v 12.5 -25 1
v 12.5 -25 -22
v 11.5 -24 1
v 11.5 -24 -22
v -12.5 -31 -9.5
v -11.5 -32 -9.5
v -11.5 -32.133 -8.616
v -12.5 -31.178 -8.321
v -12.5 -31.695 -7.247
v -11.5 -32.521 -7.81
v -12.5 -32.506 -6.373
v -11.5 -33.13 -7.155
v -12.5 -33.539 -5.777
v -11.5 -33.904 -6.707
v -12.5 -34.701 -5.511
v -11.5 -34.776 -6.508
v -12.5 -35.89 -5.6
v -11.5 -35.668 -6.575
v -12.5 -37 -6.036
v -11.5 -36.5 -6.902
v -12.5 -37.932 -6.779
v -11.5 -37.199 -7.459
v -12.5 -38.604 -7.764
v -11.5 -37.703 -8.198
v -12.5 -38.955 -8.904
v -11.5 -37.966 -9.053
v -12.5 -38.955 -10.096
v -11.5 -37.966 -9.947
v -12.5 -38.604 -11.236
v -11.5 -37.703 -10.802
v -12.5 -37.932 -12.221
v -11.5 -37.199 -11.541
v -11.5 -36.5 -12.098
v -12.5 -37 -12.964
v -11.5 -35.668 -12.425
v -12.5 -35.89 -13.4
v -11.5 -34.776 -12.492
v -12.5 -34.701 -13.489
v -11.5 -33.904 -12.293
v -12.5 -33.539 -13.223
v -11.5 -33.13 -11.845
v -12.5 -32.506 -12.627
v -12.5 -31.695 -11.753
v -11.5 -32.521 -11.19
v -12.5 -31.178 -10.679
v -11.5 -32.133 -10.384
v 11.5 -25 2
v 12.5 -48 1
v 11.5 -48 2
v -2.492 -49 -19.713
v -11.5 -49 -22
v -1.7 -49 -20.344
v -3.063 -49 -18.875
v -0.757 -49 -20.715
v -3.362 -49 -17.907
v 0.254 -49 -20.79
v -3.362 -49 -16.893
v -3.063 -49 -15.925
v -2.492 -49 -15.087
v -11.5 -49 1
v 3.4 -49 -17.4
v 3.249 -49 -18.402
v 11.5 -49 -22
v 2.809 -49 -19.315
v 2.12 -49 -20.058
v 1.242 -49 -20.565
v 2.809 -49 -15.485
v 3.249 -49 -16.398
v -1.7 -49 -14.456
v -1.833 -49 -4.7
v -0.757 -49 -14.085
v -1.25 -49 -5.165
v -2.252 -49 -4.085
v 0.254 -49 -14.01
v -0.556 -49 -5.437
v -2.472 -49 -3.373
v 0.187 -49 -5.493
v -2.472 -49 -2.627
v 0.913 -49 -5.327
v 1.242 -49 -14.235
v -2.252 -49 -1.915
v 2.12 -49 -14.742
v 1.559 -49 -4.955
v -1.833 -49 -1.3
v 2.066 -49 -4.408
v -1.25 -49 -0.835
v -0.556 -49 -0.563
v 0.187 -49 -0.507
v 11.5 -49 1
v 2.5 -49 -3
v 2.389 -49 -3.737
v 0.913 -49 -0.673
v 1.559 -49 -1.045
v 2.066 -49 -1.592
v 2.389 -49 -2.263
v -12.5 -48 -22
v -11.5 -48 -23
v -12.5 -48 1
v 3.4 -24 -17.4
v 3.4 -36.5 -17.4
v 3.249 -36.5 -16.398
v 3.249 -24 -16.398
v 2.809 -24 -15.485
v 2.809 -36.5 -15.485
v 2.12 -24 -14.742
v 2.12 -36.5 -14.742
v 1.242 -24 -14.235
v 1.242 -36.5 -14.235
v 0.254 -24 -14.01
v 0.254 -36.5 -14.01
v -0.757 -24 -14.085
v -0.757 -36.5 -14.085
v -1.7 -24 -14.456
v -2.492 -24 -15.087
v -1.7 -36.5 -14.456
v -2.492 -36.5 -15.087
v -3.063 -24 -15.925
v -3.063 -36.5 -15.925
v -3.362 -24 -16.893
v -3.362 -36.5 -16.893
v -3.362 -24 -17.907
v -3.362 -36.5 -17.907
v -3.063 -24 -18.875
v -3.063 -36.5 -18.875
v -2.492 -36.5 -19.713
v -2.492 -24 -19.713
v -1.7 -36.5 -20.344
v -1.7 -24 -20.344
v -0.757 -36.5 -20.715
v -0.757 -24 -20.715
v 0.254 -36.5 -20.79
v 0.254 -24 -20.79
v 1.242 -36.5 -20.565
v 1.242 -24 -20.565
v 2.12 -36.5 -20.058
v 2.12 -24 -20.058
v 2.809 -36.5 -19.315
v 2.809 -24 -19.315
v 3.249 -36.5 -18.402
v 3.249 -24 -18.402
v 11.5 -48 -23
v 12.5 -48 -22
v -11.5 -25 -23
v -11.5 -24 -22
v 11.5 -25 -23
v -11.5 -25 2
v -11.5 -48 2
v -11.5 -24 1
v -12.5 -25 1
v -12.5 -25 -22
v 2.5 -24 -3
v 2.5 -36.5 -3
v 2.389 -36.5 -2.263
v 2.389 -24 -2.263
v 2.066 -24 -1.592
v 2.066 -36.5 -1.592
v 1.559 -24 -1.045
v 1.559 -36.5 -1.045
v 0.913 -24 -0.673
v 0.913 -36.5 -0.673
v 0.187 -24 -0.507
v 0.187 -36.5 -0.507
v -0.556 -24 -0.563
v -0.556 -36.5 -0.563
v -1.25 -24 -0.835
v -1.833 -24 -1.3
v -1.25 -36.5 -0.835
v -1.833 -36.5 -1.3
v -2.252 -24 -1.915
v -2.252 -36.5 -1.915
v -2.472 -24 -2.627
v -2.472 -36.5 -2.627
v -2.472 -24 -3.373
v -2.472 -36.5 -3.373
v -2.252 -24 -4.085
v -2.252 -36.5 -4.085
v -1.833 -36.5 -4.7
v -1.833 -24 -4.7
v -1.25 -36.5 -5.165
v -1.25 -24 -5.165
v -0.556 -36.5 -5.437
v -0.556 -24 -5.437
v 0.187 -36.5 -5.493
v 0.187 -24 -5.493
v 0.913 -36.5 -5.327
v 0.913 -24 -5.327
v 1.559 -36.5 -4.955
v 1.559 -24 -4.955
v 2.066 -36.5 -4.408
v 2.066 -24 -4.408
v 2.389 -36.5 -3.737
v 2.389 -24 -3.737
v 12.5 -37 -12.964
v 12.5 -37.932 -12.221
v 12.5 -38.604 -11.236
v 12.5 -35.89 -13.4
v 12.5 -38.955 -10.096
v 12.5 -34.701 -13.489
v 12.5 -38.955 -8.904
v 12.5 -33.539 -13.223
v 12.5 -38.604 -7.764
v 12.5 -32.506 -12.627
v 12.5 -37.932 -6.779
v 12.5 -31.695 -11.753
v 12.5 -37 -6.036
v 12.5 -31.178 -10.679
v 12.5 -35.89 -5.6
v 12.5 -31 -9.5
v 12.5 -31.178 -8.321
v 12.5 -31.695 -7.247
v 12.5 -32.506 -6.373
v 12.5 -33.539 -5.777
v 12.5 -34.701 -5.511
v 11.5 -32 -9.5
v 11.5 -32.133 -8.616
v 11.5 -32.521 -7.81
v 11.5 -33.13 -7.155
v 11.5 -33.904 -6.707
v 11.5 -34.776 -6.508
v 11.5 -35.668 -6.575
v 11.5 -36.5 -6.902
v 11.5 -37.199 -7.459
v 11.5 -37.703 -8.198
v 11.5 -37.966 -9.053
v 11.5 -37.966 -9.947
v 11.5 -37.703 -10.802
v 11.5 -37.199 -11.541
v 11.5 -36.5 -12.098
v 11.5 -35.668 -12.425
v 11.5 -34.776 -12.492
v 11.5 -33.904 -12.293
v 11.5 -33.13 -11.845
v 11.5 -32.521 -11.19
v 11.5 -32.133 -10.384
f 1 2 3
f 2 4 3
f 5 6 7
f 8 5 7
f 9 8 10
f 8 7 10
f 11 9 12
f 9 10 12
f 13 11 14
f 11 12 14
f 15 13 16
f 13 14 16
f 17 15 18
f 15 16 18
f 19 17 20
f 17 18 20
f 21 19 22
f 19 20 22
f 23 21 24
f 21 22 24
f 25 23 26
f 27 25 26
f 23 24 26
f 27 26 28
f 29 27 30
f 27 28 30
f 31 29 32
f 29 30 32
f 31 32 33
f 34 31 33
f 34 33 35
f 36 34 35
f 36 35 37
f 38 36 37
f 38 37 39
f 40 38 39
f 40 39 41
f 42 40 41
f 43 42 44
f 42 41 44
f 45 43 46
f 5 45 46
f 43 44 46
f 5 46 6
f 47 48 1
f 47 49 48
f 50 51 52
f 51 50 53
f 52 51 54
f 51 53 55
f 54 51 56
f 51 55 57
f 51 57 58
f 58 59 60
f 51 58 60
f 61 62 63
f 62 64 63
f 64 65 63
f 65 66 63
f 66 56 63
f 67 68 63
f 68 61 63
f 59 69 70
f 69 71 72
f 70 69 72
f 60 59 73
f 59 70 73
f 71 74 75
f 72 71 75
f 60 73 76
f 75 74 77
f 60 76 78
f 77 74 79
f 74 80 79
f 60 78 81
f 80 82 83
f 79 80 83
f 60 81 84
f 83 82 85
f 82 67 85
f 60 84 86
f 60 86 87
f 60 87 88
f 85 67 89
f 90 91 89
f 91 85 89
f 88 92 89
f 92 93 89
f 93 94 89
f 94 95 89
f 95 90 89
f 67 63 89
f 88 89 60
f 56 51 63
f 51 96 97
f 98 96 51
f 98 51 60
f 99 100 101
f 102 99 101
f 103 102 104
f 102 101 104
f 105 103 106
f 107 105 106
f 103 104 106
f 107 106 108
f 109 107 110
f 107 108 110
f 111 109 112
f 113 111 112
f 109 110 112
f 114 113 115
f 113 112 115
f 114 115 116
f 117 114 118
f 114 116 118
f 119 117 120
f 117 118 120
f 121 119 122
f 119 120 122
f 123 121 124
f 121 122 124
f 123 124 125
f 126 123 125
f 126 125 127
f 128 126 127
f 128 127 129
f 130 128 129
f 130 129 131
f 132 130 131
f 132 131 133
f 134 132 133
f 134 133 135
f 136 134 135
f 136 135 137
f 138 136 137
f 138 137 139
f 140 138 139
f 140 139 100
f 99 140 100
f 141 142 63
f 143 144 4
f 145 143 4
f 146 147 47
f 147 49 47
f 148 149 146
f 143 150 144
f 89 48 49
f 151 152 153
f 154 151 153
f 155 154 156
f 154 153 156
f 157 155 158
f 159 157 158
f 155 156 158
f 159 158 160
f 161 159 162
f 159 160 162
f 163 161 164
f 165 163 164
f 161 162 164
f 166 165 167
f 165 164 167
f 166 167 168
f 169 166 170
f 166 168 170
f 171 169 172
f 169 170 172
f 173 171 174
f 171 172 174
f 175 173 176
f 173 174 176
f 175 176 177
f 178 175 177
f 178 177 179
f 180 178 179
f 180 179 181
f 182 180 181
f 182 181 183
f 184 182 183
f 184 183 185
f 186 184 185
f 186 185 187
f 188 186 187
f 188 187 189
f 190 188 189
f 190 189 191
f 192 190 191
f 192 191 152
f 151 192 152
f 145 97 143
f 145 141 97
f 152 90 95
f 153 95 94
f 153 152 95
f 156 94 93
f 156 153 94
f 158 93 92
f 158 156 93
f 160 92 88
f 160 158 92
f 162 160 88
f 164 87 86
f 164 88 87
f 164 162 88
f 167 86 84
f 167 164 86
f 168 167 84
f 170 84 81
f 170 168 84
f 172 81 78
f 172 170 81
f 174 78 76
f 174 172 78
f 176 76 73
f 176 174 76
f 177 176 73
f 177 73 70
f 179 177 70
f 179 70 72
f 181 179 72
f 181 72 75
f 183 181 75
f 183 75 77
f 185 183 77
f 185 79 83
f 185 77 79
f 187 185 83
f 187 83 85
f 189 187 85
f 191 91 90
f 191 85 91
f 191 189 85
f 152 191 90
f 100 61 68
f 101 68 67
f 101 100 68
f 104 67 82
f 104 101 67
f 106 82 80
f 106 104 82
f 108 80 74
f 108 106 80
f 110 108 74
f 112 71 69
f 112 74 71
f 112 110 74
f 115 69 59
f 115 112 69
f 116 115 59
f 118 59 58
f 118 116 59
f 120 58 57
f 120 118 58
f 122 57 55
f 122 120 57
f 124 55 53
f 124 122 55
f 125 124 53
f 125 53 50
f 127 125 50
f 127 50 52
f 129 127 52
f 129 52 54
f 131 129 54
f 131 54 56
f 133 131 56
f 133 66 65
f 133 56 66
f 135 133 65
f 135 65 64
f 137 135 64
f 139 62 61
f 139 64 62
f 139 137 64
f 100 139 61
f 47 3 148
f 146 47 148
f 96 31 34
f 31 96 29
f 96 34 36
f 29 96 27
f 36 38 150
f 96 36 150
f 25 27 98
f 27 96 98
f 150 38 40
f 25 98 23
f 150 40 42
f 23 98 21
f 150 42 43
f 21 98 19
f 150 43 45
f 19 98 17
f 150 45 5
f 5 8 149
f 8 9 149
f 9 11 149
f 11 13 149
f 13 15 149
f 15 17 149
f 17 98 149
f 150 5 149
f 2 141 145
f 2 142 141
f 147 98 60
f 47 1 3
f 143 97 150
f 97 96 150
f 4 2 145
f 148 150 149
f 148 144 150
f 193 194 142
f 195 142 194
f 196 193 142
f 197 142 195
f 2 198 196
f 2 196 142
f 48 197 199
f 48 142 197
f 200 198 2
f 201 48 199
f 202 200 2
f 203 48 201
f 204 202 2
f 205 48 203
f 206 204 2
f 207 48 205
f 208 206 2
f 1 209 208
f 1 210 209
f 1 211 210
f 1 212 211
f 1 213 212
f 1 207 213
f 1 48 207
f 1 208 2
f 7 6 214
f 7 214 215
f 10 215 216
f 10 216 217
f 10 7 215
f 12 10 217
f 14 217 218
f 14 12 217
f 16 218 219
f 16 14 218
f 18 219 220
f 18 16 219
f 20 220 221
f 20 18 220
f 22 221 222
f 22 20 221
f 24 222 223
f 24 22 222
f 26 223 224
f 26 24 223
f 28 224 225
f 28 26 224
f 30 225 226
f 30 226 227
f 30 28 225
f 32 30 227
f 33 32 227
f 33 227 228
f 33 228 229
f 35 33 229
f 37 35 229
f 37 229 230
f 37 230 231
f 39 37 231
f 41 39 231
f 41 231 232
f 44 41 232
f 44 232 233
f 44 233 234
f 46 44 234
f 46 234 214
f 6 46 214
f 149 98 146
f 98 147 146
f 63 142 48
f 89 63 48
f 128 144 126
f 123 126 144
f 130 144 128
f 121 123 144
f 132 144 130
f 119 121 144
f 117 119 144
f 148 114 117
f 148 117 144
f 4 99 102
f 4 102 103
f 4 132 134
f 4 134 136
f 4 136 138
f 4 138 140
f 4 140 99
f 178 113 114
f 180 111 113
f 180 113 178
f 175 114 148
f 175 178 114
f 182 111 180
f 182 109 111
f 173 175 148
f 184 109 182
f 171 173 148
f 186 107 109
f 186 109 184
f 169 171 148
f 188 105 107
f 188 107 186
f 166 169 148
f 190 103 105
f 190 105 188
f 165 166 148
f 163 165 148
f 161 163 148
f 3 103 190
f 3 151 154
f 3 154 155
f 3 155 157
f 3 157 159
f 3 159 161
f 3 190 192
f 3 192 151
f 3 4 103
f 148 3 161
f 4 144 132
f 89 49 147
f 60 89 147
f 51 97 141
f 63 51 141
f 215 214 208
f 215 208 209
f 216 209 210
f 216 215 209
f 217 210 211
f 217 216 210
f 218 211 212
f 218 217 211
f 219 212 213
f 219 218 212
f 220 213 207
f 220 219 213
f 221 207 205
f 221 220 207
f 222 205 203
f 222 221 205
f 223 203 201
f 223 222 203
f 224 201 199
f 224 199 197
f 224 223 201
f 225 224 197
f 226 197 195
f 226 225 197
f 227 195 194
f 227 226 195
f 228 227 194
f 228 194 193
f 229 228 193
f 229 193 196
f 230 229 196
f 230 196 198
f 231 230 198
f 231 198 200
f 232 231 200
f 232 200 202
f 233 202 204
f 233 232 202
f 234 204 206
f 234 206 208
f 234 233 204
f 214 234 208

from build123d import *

# Parameters (mm, degrees)
SKETCH014_W          = 25
SKETCH014_H          = 25
SKETCH014_R          = 3
PAD007_DEPTH         = 12.5
SKETCH015_R          = 3.4
POCKET007_DEPTH      = 12.501
POCKET007_DEPTH_BACK = 12.501
CHAMFER001_SIZE      = 1
SKETCH020_R          = 2.5
POCKET009_DEPTH      = 12.501
POCKET009_DEPTH_BACK = 12.501


with BuildPart() as part:
    # Sketch014 → Pad007 (new body, symmetric)
    with BuildSketch(Plane.YZ):
        Rectangle(SKETCH014_W, SKETCH014_H)
        with Locations((1.5, 1)):
            Circle(SKETCH014_R, mode=Mode.SUBTRACT)
    extrude(amount=PAD007_DEPTH, both=True)

    # Sketch015 → Pocket007 (cut, two sides)
    with BuildSketch(Plane.XZ) as pocket007_sk:
        with Locations((0, -6.9)):
            Circle(SKETCH015_R)
    extrude(amount=-POCKET007_DEPTH, mode=Mode.SUBTRACT)
    extrude(pocket007_sk.sketch, amount=POCKET007_DEPTH_BACK, mode=Mode.SUBTRACT)

    # Chamfer001
    chamfer001_edges = [part.edges().sort_by_distance(p)[0] for p in [
        (-12.5, 0, 12.5),
        (-12.5, 12.5, 0),
        (-12.5, 0, -12.5),
        (-12.5, -12.5, 0),
        (-12.5, -1.5, 1),
        (12.5, 0, 12.5),
        (12.5, 12.5, 0),
        (12.5, 0, -12.5),
        (12.5, -12.5, 0),
        (12.5, -1.5, 1),
        (0, -12.5, 12.5),
        (0, 12.5, 12.5),
        (0, 12.5, -12.5),
        (0, -12.5, -12.5),
    ]]
    chamfer(chamfer001_edges, length=CHAMFER001_SIZE)

    # Sketch020 → Pocket009 (cut, two sides)
    with BuildSketch(Plane.XZ) as pocket009_sk:
        with Locations((0, 7.5)):
            Circle(SKETCH020_R)
    extrude(amount=-POCKET009_DEPTH, mode=Mode.SUBTRACT)
    extrude(pocket009_sk.sketch, amount=POCKET009_DEPTH_BACK, mode=Mode.SUBTRACT)


with BuildPart() as part_1:
    # Body005 placement: moved
    add(part.part.moved(Location((0, -36.5, -10.5))))


solid = part_1.part
